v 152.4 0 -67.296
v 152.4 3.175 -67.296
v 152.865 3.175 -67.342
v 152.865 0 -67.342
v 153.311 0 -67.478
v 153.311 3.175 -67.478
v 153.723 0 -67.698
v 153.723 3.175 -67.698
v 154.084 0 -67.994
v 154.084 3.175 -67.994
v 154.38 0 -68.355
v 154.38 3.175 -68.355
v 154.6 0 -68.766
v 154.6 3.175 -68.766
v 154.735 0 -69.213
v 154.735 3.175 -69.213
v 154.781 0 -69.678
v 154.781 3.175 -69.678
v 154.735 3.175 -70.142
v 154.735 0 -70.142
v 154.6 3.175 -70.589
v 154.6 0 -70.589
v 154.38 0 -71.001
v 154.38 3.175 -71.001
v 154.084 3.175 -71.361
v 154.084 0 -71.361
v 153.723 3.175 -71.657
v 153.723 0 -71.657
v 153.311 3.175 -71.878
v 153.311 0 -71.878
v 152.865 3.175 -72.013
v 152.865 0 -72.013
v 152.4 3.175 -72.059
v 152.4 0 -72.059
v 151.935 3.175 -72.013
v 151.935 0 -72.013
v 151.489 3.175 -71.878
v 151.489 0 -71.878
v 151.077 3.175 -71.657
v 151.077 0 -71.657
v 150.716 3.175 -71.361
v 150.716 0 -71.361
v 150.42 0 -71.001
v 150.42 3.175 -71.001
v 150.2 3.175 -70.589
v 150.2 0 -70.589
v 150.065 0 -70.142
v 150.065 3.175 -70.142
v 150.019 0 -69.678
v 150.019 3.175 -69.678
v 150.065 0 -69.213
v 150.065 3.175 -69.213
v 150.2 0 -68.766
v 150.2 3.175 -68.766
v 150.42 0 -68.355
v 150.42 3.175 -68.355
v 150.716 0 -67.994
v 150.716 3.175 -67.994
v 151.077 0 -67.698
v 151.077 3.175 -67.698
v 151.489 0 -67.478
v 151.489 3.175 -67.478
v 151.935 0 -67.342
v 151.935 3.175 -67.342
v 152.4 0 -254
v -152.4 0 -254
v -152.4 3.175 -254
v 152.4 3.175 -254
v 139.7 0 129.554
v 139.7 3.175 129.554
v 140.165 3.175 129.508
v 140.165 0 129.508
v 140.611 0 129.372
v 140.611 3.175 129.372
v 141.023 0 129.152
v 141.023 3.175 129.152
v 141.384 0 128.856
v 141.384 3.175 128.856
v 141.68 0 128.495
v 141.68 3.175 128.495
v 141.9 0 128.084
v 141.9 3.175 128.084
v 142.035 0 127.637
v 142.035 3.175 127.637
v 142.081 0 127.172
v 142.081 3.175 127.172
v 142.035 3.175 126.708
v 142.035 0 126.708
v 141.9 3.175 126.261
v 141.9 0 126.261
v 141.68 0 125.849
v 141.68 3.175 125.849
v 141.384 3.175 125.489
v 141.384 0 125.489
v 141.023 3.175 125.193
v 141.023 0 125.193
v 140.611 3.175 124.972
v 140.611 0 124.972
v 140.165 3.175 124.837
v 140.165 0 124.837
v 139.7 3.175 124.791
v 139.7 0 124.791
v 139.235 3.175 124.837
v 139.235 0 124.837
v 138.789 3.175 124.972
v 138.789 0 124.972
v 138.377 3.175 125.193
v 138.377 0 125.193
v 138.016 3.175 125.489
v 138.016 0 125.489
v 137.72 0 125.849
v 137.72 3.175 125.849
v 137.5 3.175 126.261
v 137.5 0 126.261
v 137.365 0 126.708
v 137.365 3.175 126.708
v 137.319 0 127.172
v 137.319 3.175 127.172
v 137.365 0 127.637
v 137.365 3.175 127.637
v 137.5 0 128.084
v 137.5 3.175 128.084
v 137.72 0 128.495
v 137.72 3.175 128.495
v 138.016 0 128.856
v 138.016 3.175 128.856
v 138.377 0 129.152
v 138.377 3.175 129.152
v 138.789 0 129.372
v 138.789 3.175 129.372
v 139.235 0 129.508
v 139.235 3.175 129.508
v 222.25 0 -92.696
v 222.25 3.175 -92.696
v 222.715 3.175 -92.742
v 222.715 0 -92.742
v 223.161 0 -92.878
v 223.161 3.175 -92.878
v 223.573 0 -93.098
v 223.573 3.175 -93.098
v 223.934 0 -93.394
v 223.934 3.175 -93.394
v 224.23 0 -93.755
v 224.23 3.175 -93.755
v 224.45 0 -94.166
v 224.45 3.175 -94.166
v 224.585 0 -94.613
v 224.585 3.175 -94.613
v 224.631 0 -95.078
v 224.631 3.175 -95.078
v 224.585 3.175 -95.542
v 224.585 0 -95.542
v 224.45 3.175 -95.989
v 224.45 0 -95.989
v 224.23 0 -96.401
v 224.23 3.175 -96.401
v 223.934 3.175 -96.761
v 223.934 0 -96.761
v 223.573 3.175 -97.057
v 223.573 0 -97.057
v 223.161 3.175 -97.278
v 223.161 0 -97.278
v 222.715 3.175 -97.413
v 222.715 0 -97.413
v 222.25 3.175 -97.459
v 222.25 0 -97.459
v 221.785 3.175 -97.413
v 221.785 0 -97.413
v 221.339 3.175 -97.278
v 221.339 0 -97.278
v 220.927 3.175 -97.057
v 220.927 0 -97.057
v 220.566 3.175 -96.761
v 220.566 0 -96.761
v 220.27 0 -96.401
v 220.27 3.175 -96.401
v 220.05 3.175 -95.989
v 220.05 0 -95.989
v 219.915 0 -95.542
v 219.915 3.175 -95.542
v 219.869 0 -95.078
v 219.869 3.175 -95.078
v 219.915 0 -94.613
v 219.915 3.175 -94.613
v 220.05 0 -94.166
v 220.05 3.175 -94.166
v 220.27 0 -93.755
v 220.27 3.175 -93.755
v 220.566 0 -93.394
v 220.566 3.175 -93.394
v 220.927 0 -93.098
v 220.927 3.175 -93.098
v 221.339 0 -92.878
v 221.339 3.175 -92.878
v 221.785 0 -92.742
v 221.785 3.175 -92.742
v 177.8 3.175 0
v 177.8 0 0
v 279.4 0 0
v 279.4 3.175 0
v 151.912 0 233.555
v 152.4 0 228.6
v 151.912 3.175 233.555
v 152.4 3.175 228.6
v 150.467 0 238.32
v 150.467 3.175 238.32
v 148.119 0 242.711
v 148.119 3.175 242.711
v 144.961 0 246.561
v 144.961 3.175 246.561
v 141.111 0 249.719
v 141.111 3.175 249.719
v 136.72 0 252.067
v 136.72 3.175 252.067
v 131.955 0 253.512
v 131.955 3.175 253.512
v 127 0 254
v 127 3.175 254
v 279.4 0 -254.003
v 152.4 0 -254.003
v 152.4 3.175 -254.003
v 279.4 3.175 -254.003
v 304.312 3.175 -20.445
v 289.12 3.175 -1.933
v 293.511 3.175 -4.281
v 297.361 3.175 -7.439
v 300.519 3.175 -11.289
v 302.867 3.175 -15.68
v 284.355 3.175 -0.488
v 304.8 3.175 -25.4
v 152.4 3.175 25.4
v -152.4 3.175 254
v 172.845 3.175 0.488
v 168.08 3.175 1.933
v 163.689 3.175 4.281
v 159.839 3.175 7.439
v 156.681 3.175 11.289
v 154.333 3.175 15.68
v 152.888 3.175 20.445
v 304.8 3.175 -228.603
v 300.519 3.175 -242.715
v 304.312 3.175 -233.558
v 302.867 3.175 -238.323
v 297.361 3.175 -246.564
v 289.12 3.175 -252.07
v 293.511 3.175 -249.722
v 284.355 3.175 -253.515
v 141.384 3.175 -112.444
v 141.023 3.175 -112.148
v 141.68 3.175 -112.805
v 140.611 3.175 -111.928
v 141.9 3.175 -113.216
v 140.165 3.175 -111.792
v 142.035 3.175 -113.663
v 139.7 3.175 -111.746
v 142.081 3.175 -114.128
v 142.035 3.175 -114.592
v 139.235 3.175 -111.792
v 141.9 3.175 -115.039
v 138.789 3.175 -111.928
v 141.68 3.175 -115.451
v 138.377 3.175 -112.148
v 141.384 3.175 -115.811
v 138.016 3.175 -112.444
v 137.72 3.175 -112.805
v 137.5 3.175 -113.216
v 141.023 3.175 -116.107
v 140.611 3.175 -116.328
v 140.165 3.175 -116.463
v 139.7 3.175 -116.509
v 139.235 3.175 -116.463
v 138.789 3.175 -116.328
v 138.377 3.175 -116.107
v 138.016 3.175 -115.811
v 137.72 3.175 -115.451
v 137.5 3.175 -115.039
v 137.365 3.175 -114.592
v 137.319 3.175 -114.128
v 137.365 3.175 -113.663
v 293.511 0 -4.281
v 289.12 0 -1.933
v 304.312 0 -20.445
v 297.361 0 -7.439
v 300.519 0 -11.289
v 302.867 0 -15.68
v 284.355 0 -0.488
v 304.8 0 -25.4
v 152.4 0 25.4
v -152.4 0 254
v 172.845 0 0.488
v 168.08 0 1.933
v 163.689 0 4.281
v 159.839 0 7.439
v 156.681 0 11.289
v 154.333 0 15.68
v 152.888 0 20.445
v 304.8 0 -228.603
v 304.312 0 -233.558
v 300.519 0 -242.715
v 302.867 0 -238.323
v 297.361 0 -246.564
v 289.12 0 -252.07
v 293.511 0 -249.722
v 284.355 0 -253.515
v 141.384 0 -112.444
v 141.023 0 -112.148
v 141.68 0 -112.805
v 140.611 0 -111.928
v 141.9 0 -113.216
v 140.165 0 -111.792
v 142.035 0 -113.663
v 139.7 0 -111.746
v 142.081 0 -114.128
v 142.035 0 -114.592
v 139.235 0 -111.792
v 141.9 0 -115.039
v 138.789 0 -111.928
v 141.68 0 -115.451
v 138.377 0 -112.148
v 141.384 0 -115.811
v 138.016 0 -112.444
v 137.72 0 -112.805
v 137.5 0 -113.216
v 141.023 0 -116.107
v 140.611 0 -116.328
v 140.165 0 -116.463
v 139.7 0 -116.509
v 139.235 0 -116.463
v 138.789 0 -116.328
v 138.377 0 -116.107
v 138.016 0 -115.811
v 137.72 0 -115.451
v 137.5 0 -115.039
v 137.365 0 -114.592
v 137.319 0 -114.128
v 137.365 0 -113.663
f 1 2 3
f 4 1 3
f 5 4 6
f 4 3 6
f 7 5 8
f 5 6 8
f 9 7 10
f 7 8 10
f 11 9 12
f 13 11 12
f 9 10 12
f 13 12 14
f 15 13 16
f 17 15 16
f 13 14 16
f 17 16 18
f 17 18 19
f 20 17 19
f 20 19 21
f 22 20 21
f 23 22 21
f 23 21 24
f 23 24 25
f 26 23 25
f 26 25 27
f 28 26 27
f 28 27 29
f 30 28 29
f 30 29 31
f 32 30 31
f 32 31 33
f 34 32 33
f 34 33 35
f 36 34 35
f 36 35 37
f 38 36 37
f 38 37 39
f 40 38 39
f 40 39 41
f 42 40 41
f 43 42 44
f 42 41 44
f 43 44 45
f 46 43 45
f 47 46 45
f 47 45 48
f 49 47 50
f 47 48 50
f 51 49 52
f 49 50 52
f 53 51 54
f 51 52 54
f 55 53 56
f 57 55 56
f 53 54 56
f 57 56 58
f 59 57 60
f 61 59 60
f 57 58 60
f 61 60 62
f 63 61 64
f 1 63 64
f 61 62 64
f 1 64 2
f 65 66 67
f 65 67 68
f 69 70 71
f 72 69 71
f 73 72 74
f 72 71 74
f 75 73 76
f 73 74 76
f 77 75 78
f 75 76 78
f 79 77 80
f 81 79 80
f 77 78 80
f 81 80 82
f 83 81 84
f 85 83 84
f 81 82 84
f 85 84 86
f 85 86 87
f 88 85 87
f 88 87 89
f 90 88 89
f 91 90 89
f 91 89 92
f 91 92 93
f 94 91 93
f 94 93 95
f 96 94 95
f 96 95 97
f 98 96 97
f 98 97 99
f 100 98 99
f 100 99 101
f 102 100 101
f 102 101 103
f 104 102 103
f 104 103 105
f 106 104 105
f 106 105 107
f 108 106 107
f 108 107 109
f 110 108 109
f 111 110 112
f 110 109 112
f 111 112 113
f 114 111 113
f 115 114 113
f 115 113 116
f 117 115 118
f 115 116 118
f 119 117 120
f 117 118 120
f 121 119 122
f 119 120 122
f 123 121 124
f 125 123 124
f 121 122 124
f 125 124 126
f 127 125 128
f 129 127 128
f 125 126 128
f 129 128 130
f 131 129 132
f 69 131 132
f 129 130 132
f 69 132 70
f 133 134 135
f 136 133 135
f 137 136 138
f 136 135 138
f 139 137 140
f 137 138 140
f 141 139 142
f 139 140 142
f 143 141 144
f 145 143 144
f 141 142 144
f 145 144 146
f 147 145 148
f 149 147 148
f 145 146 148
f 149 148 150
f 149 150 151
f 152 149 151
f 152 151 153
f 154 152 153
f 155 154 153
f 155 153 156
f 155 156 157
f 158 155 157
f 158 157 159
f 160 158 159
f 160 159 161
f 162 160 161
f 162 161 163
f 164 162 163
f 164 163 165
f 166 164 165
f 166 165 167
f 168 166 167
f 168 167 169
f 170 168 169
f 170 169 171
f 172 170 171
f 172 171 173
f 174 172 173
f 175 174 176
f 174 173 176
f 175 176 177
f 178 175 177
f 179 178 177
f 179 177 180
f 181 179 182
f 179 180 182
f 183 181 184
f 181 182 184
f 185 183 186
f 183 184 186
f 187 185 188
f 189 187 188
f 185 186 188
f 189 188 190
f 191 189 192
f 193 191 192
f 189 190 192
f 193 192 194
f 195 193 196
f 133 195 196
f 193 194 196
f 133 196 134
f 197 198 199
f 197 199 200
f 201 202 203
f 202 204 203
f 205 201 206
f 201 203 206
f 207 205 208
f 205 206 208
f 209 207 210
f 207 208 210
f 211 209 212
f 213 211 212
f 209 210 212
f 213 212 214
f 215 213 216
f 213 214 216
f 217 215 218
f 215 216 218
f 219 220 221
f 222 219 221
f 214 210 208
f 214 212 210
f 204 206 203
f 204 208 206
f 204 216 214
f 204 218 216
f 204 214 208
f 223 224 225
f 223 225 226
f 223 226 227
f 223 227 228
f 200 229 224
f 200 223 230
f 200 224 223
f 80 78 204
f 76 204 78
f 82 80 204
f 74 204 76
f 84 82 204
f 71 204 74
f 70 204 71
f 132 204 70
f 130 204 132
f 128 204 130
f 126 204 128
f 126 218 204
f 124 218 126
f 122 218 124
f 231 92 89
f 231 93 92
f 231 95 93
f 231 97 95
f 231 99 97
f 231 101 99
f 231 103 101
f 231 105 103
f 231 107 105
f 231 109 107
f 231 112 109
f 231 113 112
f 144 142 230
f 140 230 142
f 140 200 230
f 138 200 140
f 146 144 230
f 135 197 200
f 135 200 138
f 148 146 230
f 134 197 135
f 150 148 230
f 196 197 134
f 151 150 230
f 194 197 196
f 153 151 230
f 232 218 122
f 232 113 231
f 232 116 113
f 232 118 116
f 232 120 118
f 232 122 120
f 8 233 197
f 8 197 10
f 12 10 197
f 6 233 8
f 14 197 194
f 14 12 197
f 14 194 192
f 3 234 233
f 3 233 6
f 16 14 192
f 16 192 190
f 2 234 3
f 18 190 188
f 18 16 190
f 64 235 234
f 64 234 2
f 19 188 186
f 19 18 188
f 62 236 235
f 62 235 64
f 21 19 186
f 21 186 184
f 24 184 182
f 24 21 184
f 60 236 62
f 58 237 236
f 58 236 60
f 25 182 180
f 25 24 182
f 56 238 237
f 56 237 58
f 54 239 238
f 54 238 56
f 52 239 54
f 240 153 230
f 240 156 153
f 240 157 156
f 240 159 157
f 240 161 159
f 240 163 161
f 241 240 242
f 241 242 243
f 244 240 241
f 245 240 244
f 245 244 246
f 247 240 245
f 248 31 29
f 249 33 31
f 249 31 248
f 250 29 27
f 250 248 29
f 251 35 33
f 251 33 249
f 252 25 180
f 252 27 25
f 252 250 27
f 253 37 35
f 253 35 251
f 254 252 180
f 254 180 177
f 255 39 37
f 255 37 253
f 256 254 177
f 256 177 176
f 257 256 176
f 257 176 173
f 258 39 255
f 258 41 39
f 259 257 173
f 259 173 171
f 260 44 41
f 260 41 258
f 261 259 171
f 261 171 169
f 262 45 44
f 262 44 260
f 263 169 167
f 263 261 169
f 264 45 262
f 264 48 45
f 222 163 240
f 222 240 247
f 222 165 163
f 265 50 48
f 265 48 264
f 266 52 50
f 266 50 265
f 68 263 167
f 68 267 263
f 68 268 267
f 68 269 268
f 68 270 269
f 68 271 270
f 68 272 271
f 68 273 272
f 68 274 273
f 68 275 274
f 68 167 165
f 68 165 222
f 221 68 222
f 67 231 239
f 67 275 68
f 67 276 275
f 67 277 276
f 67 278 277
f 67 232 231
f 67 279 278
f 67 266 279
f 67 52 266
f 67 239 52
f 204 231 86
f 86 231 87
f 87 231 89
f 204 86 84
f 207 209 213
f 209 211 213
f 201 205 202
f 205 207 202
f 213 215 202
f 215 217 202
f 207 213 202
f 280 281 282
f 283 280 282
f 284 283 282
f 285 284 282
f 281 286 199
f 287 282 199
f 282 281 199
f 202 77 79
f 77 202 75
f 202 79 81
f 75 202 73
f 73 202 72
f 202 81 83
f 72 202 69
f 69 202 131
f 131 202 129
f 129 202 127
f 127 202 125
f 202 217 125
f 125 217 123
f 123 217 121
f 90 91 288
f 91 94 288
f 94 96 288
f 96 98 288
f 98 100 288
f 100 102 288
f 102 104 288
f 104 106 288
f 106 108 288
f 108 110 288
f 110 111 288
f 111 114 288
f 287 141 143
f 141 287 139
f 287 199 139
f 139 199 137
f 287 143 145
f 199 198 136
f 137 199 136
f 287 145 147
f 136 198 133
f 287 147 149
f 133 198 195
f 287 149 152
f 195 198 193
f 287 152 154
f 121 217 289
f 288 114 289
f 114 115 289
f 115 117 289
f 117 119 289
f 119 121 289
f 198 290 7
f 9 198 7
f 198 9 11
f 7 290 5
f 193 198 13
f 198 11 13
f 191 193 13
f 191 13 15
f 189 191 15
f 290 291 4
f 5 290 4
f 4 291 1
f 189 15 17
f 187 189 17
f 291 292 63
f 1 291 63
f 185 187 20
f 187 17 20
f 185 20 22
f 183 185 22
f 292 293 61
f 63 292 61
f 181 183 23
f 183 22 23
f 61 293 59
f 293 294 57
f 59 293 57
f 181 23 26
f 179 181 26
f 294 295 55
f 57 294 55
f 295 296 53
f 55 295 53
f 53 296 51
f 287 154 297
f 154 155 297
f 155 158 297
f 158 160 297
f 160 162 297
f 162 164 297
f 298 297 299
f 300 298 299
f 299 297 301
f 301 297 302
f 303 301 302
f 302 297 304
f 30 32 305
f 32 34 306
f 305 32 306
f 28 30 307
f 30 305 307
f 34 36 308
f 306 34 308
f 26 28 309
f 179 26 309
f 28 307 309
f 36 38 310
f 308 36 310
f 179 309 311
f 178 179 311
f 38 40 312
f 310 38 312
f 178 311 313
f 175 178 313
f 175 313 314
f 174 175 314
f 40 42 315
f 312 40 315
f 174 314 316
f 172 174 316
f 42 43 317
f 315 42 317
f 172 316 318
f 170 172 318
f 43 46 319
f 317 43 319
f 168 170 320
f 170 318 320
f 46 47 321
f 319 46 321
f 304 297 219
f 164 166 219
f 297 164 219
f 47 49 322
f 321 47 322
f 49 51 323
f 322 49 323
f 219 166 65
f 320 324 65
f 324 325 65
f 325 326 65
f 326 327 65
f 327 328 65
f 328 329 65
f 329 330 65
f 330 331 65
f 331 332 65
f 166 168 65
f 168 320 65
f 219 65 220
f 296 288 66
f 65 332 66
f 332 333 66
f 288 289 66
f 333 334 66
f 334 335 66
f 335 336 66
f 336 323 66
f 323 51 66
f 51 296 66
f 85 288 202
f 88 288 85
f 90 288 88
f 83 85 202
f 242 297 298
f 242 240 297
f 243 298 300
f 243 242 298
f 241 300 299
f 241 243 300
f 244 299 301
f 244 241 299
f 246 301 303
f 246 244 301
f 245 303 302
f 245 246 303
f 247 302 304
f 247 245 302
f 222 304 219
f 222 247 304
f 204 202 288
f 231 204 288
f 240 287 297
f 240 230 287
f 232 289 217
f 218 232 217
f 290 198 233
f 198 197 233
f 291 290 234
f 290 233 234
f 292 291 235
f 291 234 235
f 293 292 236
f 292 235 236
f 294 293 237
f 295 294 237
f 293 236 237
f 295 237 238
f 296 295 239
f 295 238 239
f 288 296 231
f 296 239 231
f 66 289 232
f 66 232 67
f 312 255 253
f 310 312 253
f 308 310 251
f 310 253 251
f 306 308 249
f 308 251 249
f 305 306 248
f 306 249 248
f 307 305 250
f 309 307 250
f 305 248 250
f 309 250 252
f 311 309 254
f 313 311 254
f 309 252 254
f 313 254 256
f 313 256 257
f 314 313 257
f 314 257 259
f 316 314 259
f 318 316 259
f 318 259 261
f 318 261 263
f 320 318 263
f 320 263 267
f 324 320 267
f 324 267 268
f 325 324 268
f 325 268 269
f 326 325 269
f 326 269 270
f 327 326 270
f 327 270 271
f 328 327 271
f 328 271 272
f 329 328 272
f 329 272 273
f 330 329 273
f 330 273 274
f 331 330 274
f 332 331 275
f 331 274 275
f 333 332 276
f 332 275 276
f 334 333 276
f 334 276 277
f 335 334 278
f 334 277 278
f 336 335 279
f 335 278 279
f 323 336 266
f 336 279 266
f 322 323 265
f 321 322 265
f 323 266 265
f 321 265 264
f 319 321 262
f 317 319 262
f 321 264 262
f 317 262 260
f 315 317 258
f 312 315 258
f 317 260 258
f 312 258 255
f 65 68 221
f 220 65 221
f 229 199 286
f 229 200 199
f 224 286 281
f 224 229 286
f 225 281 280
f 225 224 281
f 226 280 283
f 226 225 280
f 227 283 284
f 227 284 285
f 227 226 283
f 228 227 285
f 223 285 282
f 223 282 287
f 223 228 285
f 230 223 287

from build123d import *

# Parameters (mm, degrees)
SKETCH1_W           = 304.8
SKETCH1_H           = 508
BOSS_EXTRUDE1_DEPTH = 3.175
SKETCH4_W           = 254.003143871
SKETCH4_H           = 3.175
BOSS_EXTRUDE2_DEPTH = 152.4
FILLET1_R           = 25.4
FILLET2_R           = 25.4
SKETCH2_R           = 2.38125
CUT_EXTRUDE3_DEPTH  = 152.4
FILLET3_R           = 25.4
SKETCH5_R           = 2.38125
CUT_EXTRUDE4_DEPTH  = 397.775399592


with BuildPart() as part:
    # Sketch1 → Boss-Extrude1 (new body)
    with BuildSketch(Plane(origin=(0, 0, 0), x_dir=(1, 0, 0), z_dir=(0, 1, 0))):
        Rectangle(SKETCH1_W, SKETCH1_H)
    extrude(amount=BOSS_EXTRUDE1_DEPTH)

    # Sketch4 → Boss-Extrude2 (add)
    with BuildSketch(Plane(origin=(152.4, 0, 0), x_dir=(0, 0, -1), z_dir=(1, 0, 0))):
        with Locations((127.001571936, 1.5875)):
            Rectangle(SKETCH4_W, SKETCH4_H)
    extrude(amount=BOSS_EXTRUDE2_DEPTH)

    # Fillet1
    fillet1_edges = [part.edges().sort_by_distance(p)[0] for p in [
        (152.4, 1.5875, 0),
    ]]
    fillet(fillet1_edges, radius=FILLET1_R)

    # Fillet2
    fillet2_edges = [part.edges().sort_by_distance(p)[0] for p in [
        (304.8, 1.5875, -254.003143871),
        (304.8, 1.5875, 0),
    ]]
    fillet(fillet2_edges, radius=FILLET2_R)

    # Sketch2 → Cut-Extrude3 (cut)
    with BuildSketch(Plane(origin=(0, 3.175, 0), x_dir=(1, 0, 0), z_dir=(0, 1, 0))):
        with Locations(Location((139.7, -127.172447344, 0), (0, 0, 270))):
            Circle(SKETCH2_R)
        with Locations(Location((139.7, 114.127552656, 0), (0, 0, 270))):
            Circle(SKETCH2_R)
    extrude(amount=-CUT_EXTRUDE3_DEPTH, mode=Mode.SUBTRACT)

    # Fillet3
    fillet3_edges = [part.edges().sort_by_distance(p)[0] for p in [
        (152.4, 1.5875, 254),
    ]]
    fillet(fillet3_edges, radius=FILLET3_R)

    # Sketch5 → Cut-Extrude4 (cut, through all)
    with BuildSketch(Plane(origin=(0, 3.175, 0), x_dir=(1, 0, 0), z_dir=(0, 1, 0))):
        with Locations(Location((152.4, 69.677552656, 0), (0, 0, 270))):
            Circle(SKETCH5_R)
        with Locations(Location((222.25, 95.077552656, 0), (0, 0, 270))):
            Circle(SKETCH5_R)
        with Locations(Location((139.7, 114.127552656, 0), (0, 0, 270))):
            Circle(SKETCH5_R)
    extrude(amount=-CUT_EXTRUDE4_DEPTH, mode=Mode.SUBTRACT)


solid = part.part
